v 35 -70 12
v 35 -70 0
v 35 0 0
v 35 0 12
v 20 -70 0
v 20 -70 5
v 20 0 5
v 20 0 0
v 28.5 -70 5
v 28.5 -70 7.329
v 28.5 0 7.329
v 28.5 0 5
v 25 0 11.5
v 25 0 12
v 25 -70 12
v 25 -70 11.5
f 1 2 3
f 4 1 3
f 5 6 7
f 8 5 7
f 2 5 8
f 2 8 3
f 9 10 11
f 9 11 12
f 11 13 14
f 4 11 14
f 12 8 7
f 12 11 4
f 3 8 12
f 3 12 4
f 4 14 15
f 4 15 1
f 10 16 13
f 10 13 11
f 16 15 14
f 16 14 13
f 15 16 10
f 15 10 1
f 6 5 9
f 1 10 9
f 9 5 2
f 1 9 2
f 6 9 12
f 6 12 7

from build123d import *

# Parameters (mm, degrees)
SKETCH_1_W          = 35
SKETCH_1_H          = 70
EXTRUDE_1_DEPTH     = 12
CUT_EXTRUDE_1_REACH = 81.177
SKETCH_3_W          = 20
SKETCH_3_H          = 70
CUT_EXTRUDE_2_DEPTH = 79.574805122


with BuildPart() as part:
    # 草图1 → 凸台-拉伸1 (new body)
    with BuildSketch(Plane.XY):
        with Locations((17.5, -35)):
            Rectangle(SKETCH_1_W, SKETCH_1_H)
    extrude(amount=EXTRUDE_1_DEPTH)

    # 草图2 → 切除-拉伸1 (cut, up to next)
    with BuildSketch(Plane.XZ.offset(70), mode=Mode.PRIVATE) as cut_extrude_1_sk1:
        Polygon((28.5, 7.328862426), (28.5, 5), (0, 5), (0, 12), (25, 12), (25, 11.5), align=None)
    cut_extrude_1_tool1 = extrude(cut_extrude_1_sk1.sketch, amount=-CUT_EXTRUDE_1_REACH, mode=Mode.PRIVATE) & part.part
    add(cut_extrude_1_tool1.solids().sort_by_distance((13.633689, -70, 8.408444))[0], mode=Mode.SUBTRACT)

    # 草图3 → 切除-拉伸2 (cut, through all)
    with BuildSketch(Plane.XY.offset(5)):
        with Locations((10, -35)):
            Rectangle(SKETCH_3_W, SKETCH_3_H)
    extrude(amount=-CUT_EXTRUDE_2_DEPTH, mode=Mode.SUBTRACT)


solid = part.part
